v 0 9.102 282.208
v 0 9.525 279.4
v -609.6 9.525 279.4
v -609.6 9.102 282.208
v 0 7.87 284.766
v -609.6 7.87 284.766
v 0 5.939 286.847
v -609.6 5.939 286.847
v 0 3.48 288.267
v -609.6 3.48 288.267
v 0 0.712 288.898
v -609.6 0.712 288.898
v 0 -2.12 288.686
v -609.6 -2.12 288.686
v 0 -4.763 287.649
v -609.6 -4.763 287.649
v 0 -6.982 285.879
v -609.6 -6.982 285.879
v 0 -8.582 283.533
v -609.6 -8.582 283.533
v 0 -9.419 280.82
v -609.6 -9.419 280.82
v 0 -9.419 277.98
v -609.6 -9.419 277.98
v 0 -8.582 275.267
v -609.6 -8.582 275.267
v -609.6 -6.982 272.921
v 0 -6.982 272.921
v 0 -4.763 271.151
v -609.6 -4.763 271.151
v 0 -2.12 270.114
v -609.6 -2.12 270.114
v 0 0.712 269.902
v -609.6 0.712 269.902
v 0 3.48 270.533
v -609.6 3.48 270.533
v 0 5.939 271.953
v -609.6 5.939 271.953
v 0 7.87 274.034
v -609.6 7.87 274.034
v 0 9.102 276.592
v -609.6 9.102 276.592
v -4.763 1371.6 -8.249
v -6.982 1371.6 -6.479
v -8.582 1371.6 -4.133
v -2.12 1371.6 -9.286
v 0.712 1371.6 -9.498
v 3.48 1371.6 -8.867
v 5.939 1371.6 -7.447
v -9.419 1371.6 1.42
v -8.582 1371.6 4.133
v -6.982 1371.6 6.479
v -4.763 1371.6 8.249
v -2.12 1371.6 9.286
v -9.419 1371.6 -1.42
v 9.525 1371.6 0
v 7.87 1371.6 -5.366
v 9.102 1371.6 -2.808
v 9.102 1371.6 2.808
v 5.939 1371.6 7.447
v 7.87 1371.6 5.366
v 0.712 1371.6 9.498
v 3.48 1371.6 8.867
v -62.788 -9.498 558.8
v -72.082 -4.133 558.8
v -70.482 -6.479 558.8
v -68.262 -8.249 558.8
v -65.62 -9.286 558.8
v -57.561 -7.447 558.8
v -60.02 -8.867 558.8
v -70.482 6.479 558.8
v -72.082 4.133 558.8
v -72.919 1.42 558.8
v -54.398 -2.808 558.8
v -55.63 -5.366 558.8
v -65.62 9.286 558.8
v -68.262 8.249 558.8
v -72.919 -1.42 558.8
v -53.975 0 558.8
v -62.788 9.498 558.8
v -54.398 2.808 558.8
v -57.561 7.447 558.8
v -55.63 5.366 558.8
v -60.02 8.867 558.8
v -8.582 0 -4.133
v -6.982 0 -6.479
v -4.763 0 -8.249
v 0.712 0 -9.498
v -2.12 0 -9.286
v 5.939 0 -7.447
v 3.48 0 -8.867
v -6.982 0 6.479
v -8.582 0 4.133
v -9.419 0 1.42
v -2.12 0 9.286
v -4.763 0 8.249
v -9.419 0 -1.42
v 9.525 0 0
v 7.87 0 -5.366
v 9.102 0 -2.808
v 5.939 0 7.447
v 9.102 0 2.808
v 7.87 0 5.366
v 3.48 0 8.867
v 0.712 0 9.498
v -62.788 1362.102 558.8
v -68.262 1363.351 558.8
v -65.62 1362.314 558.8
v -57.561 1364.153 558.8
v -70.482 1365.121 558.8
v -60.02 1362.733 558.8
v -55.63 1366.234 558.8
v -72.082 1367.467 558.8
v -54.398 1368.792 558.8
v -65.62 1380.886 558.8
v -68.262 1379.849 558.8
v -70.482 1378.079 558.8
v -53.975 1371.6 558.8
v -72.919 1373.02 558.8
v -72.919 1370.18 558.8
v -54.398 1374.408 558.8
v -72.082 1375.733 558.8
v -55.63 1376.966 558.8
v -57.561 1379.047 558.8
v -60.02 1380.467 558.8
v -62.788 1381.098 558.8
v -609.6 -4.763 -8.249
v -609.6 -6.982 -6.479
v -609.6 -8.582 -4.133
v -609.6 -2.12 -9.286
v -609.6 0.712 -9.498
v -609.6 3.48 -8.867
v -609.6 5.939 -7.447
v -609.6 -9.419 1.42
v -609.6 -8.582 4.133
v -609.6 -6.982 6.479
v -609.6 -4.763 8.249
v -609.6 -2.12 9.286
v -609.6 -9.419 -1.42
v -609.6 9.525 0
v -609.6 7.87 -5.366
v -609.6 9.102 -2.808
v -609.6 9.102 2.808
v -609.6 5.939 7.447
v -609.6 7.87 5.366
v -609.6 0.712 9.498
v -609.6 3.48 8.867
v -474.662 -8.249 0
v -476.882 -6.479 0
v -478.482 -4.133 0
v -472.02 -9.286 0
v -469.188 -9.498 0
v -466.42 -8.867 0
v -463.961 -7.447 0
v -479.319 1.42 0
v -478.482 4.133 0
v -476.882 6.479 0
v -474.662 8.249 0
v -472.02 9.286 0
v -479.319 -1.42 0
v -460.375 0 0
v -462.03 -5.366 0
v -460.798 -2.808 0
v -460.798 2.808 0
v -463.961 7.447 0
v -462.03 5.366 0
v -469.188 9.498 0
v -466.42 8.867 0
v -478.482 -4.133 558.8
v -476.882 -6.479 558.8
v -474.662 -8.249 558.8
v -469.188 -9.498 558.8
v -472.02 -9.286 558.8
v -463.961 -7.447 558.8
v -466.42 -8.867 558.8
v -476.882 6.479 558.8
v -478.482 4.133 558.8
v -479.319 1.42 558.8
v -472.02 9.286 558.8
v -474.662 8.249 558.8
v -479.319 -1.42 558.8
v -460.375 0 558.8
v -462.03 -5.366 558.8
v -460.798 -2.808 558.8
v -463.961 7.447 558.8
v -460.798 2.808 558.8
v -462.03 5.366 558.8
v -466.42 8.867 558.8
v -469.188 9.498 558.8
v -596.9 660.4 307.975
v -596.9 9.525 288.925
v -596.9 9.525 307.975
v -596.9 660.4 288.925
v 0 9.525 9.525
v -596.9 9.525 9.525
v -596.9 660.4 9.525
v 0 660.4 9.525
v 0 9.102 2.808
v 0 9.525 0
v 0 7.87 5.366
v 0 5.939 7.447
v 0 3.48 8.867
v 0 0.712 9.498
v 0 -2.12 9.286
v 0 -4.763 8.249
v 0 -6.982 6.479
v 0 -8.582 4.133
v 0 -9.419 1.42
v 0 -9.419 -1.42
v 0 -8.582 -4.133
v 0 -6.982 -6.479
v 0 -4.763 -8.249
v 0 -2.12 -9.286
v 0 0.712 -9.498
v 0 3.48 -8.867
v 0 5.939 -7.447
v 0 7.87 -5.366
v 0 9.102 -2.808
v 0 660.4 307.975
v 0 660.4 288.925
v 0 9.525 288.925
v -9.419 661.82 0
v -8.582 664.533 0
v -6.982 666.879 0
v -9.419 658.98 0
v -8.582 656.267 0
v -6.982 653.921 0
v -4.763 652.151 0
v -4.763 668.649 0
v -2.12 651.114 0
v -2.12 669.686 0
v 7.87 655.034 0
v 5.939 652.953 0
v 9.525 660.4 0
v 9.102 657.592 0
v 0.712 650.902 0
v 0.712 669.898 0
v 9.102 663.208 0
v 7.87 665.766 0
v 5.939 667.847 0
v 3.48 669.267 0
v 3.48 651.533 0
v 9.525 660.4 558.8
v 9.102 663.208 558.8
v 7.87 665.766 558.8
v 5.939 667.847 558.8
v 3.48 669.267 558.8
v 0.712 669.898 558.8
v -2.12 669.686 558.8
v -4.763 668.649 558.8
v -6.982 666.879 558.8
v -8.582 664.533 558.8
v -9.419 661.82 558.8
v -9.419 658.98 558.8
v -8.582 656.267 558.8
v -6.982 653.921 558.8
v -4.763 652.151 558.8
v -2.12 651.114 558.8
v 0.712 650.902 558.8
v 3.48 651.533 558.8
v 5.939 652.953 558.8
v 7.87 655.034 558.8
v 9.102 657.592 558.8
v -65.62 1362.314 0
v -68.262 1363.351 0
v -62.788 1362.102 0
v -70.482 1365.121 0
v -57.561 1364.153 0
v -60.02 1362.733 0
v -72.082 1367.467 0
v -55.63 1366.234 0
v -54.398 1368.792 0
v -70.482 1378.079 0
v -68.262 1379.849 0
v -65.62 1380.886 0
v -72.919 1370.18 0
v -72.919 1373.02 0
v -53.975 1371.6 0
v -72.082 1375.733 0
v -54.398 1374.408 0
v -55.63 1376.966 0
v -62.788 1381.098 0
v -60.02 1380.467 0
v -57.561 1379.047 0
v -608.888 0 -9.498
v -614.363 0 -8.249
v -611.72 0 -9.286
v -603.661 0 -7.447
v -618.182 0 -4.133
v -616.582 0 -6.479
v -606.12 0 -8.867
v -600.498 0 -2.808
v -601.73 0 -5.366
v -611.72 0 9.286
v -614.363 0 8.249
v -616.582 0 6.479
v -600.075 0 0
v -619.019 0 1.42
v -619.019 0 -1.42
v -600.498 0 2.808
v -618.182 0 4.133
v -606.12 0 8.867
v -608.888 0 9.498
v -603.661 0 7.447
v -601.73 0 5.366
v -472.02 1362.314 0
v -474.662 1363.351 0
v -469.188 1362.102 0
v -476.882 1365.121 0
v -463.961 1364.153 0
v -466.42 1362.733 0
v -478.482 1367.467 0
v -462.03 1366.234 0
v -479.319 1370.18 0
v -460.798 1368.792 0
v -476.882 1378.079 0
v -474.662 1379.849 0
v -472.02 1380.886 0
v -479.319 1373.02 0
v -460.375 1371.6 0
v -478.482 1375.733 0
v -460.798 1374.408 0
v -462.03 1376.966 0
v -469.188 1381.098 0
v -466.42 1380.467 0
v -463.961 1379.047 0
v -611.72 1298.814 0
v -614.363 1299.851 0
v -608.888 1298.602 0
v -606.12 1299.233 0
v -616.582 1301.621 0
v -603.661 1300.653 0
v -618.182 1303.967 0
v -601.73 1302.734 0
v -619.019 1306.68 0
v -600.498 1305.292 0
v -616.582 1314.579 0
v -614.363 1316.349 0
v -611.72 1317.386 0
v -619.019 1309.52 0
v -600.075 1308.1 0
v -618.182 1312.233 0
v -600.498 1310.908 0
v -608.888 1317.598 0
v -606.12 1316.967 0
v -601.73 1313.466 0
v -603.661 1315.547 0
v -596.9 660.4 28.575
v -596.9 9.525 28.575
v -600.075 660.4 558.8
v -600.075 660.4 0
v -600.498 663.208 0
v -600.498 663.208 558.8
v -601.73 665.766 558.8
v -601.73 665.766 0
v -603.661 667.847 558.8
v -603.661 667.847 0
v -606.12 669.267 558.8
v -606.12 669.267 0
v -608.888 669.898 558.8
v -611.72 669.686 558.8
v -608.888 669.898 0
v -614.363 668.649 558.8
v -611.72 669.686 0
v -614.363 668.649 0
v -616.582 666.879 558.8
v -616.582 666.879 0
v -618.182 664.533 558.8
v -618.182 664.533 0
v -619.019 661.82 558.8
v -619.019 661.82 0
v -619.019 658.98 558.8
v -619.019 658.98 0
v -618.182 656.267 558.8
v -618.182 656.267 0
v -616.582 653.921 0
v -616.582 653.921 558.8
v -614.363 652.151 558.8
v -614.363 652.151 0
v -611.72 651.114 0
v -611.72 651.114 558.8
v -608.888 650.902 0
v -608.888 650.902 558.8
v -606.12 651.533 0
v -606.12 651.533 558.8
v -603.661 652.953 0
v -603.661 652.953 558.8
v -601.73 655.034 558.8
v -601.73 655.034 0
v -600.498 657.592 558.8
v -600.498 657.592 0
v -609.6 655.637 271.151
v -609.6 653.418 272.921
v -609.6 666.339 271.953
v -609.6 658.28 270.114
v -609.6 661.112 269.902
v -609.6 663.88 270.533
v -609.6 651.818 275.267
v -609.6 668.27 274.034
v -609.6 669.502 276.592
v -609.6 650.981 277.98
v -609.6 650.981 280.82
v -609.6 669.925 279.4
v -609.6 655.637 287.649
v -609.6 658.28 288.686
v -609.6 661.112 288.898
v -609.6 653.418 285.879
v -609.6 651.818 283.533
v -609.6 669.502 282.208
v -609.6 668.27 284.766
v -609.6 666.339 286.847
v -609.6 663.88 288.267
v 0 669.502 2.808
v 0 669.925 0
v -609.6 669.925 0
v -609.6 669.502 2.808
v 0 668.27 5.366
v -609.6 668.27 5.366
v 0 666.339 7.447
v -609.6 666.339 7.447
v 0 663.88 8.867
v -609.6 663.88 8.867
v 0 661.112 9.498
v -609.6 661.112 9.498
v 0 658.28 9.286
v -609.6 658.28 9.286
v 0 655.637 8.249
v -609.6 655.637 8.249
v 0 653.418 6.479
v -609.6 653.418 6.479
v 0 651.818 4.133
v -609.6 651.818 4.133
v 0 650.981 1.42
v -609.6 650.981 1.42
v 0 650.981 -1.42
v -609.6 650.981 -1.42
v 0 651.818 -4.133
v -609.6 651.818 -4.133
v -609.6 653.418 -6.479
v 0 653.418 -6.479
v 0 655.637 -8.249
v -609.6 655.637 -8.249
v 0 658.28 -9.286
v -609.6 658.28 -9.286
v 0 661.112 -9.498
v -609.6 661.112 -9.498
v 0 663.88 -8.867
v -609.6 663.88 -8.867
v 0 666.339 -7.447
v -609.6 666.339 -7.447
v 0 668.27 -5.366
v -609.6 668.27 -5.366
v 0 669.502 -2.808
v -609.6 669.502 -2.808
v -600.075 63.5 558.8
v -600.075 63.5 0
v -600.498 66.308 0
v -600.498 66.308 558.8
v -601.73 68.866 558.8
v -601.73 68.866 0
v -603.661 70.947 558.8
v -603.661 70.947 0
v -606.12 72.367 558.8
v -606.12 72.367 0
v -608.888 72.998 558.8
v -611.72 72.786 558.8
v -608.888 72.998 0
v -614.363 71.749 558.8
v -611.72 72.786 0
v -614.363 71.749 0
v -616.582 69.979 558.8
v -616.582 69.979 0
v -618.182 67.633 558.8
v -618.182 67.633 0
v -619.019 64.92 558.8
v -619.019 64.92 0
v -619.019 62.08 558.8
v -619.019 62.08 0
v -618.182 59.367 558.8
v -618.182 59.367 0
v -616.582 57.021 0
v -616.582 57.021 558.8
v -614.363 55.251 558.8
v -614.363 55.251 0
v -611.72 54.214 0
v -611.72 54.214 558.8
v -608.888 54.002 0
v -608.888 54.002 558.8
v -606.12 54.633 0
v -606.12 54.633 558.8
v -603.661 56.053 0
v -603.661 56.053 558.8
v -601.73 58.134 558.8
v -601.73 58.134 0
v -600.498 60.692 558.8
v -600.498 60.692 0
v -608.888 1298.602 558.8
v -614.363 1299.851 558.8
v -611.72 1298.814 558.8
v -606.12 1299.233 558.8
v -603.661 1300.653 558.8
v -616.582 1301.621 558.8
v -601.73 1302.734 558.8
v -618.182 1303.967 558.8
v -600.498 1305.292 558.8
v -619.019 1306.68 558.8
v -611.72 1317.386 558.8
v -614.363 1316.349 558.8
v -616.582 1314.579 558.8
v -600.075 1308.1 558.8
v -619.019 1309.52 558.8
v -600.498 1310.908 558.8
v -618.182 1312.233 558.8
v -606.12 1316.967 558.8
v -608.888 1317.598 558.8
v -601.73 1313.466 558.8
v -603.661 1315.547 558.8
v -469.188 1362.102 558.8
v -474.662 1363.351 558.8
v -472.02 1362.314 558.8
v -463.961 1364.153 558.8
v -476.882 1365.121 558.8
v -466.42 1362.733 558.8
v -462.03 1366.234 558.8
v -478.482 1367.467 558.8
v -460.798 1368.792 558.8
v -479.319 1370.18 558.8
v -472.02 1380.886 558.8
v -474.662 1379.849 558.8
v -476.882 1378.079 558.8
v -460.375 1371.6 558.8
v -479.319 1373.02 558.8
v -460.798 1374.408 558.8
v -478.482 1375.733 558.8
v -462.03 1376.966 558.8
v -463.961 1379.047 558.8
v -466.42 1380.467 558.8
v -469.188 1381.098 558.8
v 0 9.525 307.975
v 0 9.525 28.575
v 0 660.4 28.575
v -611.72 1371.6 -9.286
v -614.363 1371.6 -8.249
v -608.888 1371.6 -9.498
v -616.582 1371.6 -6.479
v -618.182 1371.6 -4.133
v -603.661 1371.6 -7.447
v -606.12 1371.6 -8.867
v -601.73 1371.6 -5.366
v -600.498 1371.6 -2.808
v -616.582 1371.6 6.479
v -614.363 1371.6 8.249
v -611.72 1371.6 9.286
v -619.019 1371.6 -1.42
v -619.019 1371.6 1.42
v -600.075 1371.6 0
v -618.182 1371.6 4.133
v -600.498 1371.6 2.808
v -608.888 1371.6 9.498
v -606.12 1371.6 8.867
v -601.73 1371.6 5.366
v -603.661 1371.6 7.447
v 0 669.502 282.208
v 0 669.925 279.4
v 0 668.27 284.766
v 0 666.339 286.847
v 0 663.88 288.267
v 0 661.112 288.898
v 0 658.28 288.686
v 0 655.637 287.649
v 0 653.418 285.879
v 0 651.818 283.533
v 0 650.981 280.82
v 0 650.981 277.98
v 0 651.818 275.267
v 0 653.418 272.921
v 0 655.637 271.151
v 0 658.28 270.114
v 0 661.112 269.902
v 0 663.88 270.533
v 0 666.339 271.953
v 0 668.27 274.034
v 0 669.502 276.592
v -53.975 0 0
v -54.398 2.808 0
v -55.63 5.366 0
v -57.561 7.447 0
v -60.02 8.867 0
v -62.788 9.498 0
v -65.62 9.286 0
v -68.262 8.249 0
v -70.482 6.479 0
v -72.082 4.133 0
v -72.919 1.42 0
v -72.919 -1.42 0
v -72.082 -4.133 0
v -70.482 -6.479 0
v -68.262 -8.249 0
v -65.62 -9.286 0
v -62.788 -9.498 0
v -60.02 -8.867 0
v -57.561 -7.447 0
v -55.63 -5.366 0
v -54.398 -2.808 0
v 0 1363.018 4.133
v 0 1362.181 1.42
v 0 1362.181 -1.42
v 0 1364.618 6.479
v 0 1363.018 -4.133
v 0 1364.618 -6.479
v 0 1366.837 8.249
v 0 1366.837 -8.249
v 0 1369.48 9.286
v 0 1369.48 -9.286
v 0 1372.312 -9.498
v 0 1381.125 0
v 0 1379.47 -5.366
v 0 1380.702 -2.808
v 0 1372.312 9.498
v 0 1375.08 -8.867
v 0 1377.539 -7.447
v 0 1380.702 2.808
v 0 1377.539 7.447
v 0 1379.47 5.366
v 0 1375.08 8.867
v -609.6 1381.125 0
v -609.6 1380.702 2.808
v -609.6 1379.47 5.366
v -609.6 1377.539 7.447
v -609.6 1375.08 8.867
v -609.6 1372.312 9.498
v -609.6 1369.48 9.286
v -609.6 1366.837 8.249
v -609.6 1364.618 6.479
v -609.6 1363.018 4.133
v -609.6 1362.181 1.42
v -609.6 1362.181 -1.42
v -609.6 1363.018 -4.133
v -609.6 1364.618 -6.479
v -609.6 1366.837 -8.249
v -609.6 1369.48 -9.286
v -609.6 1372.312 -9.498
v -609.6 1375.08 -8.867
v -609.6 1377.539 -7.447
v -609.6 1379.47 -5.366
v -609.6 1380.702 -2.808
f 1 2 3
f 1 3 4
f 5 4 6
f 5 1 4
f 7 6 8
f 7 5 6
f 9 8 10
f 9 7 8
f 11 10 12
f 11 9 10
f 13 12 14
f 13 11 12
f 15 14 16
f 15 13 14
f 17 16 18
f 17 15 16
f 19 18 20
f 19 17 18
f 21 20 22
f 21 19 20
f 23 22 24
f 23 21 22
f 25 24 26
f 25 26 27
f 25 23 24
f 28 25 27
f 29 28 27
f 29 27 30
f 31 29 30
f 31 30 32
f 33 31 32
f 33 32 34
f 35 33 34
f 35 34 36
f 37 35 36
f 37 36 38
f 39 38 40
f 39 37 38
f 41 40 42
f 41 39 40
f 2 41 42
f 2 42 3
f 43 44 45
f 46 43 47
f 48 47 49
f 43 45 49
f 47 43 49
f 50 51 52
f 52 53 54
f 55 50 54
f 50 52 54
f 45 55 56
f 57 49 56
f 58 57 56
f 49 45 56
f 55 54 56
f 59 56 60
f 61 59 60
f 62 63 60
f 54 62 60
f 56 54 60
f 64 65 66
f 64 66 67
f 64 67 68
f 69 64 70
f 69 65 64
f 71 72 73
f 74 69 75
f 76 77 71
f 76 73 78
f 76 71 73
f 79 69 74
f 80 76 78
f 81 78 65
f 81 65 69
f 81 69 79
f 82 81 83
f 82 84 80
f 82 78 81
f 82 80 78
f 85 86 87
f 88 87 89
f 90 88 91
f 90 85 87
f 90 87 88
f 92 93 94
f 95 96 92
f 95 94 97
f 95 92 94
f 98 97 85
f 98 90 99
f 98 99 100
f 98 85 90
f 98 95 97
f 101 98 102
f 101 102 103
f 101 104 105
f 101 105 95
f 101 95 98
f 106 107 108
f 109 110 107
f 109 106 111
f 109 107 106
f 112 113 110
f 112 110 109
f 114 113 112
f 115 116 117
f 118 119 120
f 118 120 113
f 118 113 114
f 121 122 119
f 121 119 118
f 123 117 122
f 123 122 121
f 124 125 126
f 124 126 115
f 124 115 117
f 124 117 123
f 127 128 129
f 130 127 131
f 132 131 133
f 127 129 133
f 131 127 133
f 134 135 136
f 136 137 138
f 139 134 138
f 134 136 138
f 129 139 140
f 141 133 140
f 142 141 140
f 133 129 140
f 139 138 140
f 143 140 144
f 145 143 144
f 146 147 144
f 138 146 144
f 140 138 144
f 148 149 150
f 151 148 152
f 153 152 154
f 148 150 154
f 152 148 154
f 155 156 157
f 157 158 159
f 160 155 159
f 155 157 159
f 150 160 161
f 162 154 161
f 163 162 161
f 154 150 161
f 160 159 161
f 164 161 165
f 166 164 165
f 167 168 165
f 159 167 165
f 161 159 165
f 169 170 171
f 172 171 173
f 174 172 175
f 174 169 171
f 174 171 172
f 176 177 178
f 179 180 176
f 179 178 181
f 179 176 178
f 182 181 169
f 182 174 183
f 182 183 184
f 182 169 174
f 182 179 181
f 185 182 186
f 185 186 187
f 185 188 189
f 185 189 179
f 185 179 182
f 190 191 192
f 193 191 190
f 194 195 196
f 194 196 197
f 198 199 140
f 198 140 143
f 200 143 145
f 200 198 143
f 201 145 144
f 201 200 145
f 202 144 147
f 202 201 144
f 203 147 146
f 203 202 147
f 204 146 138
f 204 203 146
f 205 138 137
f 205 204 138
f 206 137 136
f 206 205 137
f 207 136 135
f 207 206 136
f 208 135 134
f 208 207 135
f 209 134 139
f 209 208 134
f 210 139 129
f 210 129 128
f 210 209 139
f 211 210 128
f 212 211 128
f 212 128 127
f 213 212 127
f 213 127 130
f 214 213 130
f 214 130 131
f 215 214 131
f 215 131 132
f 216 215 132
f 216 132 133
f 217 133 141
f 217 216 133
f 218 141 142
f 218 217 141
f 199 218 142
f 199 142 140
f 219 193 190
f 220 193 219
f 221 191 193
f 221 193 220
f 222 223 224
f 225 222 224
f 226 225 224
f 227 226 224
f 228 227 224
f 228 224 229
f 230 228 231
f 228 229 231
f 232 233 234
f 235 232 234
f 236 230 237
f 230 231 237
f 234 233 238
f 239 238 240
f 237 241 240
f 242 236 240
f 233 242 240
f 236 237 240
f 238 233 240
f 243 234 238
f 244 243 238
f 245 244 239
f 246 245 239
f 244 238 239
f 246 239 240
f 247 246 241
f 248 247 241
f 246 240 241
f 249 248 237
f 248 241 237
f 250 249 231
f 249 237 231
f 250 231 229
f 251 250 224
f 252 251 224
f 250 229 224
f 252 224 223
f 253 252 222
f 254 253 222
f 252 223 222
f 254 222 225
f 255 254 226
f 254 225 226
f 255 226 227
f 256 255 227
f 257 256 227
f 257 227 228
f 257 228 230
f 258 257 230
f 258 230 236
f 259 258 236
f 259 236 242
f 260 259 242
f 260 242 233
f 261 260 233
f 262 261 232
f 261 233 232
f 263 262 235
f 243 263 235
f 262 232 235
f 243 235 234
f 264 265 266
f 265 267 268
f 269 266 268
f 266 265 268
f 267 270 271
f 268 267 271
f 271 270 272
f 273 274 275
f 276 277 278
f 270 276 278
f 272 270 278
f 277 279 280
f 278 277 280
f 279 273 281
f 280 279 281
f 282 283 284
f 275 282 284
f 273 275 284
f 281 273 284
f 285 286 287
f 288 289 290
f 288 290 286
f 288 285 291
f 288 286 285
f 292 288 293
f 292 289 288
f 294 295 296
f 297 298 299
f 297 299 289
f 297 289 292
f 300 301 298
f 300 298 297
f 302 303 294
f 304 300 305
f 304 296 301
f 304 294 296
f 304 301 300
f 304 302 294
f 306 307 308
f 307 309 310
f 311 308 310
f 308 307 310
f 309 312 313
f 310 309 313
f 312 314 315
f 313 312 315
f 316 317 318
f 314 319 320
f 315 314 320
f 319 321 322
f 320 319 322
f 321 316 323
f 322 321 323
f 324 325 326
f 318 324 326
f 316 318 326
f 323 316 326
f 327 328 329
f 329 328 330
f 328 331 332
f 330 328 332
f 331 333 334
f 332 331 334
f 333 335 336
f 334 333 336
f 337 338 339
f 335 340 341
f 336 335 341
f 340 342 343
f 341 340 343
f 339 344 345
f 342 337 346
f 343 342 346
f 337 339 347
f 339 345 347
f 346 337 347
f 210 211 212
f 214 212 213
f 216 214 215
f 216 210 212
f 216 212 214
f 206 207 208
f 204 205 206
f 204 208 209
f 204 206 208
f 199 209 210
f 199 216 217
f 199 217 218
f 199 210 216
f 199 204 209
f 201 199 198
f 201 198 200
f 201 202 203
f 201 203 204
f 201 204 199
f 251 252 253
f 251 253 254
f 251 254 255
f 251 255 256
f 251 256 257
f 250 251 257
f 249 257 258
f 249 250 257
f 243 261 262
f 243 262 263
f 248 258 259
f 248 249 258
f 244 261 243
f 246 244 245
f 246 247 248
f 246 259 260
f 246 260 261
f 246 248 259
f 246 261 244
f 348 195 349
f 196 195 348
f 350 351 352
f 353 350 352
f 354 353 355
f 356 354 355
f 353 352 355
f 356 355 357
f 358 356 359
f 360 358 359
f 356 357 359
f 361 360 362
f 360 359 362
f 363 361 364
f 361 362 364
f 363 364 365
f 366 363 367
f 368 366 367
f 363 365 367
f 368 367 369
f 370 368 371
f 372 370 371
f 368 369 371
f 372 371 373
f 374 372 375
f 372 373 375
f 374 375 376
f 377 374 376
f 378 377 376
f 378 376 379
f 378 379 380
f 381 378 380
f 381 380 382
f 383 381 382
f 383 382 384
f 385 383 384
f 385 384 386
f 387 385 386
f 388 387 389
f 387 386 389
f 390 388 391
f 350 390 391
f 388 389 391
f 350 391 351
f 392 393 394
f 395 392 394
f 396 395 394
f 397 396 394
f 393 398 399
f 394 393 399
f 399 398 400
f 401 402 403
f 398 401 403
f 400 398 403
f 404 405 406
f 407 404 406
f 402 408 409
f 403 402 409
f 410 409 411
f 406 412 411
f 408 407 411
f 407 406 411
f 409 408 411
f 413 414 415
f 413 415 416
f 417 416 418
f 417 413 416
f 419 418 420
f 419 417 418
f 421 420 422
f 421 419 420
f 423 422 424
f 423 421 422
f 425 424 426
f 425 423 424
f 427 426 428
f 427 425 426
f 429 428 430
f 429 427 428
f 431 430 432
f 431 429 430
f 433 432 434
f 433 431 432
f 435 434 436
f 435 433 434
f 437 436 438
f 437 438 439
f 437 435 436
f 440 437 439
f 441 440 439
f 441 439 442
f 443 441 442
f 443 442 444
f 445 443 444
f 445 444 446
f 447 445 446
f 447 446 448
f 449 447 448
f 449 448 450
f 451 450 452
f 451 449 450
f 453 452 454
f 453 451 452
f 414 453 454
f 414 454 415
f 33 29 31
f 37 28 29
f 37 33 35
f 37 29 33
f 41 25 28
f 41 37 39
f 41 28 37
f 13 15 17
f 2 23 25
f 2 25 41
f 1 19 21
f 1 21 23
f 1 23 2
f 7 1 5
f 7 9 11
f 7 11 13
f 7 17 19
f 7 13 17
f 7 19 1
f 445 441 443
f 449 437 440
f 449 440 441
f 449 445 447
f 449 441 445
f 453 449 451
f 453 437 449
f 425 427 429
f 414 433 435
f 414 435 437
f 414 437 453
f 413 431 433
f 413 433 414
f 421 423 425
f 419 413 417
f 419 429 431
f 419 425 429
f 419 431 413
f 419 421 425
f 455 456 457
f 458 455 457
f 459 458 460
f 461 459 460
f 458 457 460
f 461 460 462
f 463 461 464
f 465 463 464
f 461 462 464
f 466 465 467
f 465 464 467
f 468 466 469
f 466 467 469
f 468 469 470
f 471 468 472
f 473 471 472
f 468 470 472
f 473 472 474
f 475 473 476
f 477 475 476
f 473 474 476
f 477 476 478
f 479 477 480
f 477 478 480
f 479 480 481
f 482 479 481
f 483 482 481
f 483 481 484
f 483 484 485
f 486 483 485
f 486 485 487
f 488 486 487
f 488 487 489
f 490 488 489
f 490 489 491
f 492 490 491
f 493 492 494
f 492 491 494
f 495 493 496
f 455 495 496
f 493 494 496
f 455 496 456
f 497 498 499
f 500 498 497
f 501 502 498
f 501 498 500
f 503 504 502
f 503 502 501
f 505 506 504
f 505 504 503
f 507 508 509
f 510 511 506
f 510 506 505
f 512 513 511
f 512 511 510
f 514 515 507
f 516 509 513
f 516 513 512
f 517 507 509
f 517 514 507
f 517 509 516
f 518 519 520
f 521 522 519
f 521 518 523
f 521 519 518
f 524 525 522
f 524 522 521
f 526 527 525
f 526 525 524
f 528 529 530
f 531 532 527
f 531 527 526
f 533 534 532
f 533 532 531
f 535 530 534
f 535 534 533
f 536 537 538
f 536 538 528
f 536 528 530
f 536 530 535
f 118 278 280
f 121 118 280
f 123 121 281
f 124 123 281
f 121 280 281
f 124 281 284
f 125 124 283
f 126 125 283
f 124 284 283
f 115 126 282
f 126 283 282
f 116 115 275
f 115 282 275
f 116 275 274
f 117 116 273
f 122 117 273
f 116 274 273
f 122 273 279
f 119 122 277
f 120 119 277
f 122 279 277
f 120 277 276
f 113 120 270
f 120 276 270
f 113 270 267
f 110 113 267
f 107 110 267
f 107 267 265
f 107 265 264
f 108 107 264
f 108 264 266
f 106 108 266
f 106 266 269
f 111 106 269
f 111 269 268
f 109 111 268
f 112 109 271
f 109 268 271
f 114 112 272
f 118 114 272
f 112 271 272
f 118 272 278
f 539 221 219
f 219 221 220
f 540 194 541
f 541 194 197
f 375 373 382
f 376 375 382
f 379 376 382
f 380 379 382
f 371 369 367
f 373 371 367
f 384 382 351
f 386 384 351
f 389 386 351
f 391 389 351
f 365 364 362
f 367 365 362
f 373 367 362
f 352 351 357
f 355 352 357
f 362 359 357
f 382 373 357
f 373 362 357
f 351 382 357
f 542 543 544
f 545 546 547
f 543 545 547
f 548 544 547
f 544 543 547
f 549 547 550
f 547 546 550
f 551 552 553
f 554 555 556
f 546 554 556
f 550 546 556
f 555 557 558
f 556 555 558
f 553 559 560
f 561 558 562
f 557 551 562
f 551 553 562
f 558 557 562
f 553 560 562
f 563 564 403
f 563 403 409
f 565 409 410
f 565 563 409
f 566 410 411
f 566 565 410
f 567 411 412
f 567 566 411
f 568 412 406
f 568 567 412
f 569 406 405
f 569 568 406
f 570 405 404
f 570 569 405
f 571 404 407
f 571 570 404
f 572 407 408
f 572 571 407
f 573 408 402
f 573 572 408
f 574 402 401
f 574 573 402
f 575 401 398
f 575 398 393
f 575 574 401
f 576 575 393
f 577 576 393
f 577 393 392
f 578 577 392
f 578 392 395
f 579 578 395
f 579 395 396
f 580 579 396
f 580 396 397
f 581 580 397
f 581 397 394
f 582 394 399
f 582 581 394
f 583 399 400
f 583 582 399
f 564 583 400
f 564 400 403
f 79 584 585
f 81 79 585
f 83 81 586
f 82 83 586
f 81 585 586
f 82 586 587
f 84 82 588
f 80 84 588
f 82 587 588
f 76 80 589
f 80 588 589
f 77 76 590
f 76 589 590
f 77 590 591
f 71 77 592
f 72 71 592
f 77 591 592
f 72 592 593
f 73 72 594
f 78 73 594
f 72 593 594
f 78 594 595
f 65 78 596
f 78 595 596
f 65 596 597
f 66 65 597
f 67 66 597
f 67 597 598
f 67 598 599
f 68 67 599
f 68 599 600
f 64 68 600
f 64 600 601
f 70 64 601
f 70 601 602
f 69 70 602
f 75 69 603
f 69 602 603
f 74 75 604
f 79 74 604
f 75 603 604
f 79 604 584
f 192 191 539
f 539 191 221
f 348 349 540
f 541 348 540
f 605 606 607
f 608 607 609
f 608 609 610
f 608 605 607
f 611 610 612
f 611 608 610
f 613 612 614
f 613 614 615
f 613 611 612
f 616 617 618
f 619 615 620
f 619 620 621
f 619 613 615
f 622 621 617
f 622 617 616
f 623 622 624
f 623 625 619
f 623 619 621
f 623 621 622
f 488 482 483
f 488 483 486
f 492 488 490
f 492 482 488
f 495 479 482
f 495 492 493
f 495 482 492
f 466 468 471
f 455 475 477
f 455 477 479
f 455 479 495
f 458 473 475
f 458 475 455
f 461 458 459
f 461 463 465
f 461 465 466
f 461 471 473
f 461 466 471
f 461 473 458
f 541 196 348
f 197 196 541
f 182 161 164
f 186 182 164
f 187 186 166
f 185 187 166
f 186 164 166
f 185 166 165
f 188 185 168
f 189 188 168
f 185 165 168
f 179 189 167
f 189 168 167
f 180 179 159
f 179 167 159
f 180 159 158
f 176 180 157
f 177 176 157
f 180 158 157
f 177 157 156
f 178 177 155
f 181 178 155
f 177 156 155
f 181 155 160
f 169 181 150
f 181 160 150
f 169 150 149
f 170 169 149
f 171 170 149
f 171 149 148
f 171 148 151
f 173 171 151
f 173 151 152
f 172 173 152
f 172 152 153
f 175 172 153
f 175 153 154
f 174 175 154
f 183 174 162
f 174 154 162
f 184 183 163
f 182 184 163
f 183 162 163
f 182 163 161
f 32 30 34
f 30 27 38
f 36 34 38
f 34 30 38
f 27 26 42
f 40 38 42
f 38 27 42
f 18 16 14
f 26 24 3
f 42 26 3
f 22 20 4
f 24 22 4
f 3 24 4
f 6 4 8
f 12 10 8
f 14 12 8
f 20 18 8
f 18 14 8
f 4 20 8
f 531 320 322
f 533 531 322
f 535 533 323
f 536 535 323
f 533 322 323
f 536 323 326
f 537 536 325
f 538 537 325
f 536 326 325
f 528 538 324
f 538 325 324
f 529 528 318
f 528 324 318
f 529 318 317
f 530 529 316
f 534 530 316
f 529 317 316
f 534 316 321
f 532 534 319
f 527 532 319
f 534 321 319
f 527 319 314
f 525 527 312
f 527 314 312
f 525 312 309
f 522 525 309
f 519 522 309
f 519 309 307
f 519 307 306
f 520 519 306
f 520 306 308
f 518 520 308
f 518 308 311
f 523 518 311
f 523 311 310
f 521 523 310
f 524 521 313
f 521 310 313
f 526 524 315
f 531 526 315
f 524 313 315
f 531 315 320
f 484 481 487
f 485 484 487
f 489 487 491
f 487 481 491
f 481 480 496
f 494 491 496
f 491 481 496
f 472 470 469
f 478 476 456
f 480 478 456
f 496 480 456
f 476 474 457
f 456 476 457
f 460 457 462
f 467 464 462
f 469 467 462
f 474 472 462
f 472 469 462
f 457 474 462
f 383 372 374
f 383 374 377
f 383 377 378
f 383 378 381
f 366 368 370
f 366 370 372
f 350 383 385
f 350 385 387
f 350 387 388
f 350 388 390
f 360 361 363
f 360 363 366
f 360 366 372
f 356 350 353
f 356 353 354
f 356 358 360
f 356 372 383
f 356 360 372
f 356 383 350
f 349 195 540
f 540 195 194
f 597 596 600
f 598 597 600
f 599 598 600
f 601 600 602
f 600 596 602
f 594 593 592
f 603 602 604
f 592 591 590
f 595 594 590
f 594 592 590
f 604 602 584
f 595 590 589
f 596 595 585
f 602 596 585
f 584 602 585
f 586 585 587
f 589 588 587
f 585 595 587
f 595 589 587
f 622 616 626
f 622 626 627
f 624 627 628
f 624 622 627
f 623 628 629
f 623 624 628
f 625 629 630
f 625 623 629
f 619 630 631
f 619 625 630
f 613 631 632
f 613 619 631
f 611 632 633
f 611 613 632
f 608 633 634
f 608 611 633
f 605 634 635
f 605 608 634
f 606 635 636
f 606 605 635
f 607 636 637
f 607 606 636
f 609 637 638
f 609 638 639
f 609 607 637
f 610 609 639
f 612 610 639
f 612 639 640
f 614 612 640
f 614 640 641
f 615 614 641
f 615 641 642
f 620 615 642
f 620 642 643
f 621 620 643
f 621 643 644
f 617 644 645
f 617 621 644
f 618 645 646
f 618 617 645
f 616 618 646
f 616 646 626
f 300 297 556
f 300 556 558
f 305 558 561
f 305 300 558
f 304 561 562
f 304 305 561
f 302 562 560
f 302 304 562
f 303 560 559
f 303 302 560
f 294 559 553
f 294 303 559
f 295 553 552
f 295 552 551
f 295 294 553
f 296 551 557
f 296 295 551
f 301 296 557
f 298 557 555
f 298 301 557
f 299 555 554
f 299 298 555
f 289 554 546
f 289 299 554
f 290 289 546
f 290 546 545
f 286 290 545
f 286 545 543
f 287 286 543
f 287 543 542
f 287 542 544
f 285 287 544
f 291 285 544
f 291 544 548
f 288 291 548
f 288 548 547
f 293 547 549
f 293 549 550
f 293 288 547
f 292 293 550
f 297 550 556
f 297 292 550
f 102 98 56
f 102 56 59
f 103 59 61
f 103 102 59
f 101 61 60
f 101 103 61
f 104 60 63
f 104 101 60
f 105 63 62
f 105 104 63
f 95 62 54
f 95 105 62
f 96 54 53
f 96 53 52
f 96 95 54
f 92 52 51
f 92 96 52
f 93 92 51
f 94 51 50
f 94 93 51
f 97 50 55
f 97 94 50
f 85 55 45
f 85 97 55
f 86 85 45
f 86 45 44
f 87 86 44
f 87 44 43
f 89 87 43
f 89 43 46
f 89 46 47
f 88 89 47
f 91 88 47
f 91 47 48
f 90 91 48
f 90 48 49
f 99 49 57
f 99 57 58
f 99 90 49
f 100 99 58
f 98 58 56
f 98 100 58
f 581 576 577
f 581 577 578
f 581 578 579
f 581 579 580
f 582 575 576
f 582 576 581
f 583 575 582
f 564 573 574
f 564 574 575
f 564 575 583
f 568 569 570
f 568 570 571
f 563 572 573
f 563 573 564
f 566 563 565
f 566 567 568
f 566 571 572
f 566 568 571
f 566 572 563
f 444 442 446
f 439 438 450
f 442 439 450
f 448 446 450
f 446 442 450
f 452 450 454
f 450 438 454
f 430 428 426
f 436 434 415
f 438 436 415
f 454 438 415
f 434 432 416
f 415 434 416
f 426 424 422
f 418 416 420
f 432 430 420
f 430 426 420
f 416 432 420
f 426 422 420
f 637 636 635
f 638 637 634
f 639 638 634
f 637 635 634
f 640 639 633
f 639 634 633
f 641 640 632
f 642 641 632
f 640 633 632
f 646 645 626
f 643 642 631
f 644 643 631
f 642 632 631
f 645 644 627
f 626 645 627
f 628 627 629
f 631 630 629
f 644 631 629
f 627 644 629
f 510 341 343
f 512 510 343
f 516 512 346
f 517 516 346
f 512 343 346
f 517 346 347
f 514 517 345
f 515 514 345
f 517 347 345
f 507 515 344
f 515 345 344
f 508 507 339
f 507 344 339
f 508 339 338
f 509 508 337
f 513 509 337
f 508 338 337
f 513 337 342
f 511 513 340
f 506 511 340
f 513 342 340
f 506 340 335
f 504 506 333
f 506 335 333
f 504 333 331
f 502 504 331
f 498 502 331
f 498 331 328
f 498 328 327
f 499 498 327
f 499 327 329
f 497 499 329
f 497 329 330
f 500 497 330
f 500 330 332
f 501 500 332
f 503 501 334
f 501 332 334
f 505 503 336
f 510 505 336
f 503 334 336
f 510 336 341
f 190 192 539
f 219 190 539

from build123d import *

# Parameters (mm, degrees)
F0_R      = 9.525
F1_DEPTH  = 1371.6
F2_R      = 9.525
F3_DEPTH  = 609.6
F4_R      = 9.525
F5_DEPTH  = 558.8
F6_R      = 9.525
F7_DEPTH  = 609.6
F9_W      = 596.9
F9_H      = 650.875
F10_DEPTH = 19.05
F12_W     = 596.9
F12_H     = 650.875
F13_DEPTH = 19.05


with BuildPart() as f1:
    # F0 (on Front) → F1 (new body)
    with BuildSketch(Plane.XZ):
        Circle(F0_R)
        with Locations((-609.6, 0)):
            Circle(F0_R)
    extrude(amount=-F1_DEPTH)


with BuildPart() as f3:
    # F2 (on Right) → F3 (new body)
    with BuildSketch(Plane.YZ):
        Circle(F2_R)
        with Locations((1371.6, 0)):
            Circle(F2_R)
    extrude(amount=-F3_DEPTH)


with BuildPart() as f5:
    # F4 (on Top) → F5 (new body)
    with BuildSketch(Plane.XY):
        with Locations((-63.5, 0)):
            Circle(F4_R)
        with Locations((-469.9, 0)):
            Circle(F4_R)
        with Locations((-609.6, 63.5)):
            Circle(F4_R)
        with Locations((-609.6, 1308.1)):
            Circle(F4_R)
        with Locations((-469.9, 1371.6)):
            Circle(F4_R)
        with Locations((-63.5, 1371.6)):
            Circle(F4_R)
        with Locations((-609.6, 660.4)):
            Circle(F4_R)
        with Locations((0, 660.4)):
            Circle(F4_R)
    extrude(amount=F5_DEPTH)


with BuildPart() as f7:
    # F6 (on Right) → F7 (new body)
    with BuildSketch(Plane.YZ):
        with Locations((660.4, 0)):
            Circle(F6_R)
        with Locations((660.4, 279.4)):
            Circle(F6_R)
        with Locations((0, 279.4)):
            Circle(F6_R)
    extrude(amount=-F7_DEPTH)


with BuildPart() as f10:
    # F9 (on offset) → F10 (new body)
    with BuildSketch(Plane.XY.offset(9.525)):
        with Locations((-298.45, 334.9625)):
            Rectangle(F9_W, F9_H)
    extrude(amount=F10_DEPTH)


with BuildPart() as f13:
    # F12 (on offset) → F13 (new body)
    with BuildSketch(Plane.XY.offset(288.925)):
        with Locations((-298.45, 334.9625)):
            Rectangle(F12_W, F12_H)
    extrude(amount=F13_DEPTH)


solid = Compound([f1.part, f3.part, f5.part, f7.part, f10.part, f13.part])
